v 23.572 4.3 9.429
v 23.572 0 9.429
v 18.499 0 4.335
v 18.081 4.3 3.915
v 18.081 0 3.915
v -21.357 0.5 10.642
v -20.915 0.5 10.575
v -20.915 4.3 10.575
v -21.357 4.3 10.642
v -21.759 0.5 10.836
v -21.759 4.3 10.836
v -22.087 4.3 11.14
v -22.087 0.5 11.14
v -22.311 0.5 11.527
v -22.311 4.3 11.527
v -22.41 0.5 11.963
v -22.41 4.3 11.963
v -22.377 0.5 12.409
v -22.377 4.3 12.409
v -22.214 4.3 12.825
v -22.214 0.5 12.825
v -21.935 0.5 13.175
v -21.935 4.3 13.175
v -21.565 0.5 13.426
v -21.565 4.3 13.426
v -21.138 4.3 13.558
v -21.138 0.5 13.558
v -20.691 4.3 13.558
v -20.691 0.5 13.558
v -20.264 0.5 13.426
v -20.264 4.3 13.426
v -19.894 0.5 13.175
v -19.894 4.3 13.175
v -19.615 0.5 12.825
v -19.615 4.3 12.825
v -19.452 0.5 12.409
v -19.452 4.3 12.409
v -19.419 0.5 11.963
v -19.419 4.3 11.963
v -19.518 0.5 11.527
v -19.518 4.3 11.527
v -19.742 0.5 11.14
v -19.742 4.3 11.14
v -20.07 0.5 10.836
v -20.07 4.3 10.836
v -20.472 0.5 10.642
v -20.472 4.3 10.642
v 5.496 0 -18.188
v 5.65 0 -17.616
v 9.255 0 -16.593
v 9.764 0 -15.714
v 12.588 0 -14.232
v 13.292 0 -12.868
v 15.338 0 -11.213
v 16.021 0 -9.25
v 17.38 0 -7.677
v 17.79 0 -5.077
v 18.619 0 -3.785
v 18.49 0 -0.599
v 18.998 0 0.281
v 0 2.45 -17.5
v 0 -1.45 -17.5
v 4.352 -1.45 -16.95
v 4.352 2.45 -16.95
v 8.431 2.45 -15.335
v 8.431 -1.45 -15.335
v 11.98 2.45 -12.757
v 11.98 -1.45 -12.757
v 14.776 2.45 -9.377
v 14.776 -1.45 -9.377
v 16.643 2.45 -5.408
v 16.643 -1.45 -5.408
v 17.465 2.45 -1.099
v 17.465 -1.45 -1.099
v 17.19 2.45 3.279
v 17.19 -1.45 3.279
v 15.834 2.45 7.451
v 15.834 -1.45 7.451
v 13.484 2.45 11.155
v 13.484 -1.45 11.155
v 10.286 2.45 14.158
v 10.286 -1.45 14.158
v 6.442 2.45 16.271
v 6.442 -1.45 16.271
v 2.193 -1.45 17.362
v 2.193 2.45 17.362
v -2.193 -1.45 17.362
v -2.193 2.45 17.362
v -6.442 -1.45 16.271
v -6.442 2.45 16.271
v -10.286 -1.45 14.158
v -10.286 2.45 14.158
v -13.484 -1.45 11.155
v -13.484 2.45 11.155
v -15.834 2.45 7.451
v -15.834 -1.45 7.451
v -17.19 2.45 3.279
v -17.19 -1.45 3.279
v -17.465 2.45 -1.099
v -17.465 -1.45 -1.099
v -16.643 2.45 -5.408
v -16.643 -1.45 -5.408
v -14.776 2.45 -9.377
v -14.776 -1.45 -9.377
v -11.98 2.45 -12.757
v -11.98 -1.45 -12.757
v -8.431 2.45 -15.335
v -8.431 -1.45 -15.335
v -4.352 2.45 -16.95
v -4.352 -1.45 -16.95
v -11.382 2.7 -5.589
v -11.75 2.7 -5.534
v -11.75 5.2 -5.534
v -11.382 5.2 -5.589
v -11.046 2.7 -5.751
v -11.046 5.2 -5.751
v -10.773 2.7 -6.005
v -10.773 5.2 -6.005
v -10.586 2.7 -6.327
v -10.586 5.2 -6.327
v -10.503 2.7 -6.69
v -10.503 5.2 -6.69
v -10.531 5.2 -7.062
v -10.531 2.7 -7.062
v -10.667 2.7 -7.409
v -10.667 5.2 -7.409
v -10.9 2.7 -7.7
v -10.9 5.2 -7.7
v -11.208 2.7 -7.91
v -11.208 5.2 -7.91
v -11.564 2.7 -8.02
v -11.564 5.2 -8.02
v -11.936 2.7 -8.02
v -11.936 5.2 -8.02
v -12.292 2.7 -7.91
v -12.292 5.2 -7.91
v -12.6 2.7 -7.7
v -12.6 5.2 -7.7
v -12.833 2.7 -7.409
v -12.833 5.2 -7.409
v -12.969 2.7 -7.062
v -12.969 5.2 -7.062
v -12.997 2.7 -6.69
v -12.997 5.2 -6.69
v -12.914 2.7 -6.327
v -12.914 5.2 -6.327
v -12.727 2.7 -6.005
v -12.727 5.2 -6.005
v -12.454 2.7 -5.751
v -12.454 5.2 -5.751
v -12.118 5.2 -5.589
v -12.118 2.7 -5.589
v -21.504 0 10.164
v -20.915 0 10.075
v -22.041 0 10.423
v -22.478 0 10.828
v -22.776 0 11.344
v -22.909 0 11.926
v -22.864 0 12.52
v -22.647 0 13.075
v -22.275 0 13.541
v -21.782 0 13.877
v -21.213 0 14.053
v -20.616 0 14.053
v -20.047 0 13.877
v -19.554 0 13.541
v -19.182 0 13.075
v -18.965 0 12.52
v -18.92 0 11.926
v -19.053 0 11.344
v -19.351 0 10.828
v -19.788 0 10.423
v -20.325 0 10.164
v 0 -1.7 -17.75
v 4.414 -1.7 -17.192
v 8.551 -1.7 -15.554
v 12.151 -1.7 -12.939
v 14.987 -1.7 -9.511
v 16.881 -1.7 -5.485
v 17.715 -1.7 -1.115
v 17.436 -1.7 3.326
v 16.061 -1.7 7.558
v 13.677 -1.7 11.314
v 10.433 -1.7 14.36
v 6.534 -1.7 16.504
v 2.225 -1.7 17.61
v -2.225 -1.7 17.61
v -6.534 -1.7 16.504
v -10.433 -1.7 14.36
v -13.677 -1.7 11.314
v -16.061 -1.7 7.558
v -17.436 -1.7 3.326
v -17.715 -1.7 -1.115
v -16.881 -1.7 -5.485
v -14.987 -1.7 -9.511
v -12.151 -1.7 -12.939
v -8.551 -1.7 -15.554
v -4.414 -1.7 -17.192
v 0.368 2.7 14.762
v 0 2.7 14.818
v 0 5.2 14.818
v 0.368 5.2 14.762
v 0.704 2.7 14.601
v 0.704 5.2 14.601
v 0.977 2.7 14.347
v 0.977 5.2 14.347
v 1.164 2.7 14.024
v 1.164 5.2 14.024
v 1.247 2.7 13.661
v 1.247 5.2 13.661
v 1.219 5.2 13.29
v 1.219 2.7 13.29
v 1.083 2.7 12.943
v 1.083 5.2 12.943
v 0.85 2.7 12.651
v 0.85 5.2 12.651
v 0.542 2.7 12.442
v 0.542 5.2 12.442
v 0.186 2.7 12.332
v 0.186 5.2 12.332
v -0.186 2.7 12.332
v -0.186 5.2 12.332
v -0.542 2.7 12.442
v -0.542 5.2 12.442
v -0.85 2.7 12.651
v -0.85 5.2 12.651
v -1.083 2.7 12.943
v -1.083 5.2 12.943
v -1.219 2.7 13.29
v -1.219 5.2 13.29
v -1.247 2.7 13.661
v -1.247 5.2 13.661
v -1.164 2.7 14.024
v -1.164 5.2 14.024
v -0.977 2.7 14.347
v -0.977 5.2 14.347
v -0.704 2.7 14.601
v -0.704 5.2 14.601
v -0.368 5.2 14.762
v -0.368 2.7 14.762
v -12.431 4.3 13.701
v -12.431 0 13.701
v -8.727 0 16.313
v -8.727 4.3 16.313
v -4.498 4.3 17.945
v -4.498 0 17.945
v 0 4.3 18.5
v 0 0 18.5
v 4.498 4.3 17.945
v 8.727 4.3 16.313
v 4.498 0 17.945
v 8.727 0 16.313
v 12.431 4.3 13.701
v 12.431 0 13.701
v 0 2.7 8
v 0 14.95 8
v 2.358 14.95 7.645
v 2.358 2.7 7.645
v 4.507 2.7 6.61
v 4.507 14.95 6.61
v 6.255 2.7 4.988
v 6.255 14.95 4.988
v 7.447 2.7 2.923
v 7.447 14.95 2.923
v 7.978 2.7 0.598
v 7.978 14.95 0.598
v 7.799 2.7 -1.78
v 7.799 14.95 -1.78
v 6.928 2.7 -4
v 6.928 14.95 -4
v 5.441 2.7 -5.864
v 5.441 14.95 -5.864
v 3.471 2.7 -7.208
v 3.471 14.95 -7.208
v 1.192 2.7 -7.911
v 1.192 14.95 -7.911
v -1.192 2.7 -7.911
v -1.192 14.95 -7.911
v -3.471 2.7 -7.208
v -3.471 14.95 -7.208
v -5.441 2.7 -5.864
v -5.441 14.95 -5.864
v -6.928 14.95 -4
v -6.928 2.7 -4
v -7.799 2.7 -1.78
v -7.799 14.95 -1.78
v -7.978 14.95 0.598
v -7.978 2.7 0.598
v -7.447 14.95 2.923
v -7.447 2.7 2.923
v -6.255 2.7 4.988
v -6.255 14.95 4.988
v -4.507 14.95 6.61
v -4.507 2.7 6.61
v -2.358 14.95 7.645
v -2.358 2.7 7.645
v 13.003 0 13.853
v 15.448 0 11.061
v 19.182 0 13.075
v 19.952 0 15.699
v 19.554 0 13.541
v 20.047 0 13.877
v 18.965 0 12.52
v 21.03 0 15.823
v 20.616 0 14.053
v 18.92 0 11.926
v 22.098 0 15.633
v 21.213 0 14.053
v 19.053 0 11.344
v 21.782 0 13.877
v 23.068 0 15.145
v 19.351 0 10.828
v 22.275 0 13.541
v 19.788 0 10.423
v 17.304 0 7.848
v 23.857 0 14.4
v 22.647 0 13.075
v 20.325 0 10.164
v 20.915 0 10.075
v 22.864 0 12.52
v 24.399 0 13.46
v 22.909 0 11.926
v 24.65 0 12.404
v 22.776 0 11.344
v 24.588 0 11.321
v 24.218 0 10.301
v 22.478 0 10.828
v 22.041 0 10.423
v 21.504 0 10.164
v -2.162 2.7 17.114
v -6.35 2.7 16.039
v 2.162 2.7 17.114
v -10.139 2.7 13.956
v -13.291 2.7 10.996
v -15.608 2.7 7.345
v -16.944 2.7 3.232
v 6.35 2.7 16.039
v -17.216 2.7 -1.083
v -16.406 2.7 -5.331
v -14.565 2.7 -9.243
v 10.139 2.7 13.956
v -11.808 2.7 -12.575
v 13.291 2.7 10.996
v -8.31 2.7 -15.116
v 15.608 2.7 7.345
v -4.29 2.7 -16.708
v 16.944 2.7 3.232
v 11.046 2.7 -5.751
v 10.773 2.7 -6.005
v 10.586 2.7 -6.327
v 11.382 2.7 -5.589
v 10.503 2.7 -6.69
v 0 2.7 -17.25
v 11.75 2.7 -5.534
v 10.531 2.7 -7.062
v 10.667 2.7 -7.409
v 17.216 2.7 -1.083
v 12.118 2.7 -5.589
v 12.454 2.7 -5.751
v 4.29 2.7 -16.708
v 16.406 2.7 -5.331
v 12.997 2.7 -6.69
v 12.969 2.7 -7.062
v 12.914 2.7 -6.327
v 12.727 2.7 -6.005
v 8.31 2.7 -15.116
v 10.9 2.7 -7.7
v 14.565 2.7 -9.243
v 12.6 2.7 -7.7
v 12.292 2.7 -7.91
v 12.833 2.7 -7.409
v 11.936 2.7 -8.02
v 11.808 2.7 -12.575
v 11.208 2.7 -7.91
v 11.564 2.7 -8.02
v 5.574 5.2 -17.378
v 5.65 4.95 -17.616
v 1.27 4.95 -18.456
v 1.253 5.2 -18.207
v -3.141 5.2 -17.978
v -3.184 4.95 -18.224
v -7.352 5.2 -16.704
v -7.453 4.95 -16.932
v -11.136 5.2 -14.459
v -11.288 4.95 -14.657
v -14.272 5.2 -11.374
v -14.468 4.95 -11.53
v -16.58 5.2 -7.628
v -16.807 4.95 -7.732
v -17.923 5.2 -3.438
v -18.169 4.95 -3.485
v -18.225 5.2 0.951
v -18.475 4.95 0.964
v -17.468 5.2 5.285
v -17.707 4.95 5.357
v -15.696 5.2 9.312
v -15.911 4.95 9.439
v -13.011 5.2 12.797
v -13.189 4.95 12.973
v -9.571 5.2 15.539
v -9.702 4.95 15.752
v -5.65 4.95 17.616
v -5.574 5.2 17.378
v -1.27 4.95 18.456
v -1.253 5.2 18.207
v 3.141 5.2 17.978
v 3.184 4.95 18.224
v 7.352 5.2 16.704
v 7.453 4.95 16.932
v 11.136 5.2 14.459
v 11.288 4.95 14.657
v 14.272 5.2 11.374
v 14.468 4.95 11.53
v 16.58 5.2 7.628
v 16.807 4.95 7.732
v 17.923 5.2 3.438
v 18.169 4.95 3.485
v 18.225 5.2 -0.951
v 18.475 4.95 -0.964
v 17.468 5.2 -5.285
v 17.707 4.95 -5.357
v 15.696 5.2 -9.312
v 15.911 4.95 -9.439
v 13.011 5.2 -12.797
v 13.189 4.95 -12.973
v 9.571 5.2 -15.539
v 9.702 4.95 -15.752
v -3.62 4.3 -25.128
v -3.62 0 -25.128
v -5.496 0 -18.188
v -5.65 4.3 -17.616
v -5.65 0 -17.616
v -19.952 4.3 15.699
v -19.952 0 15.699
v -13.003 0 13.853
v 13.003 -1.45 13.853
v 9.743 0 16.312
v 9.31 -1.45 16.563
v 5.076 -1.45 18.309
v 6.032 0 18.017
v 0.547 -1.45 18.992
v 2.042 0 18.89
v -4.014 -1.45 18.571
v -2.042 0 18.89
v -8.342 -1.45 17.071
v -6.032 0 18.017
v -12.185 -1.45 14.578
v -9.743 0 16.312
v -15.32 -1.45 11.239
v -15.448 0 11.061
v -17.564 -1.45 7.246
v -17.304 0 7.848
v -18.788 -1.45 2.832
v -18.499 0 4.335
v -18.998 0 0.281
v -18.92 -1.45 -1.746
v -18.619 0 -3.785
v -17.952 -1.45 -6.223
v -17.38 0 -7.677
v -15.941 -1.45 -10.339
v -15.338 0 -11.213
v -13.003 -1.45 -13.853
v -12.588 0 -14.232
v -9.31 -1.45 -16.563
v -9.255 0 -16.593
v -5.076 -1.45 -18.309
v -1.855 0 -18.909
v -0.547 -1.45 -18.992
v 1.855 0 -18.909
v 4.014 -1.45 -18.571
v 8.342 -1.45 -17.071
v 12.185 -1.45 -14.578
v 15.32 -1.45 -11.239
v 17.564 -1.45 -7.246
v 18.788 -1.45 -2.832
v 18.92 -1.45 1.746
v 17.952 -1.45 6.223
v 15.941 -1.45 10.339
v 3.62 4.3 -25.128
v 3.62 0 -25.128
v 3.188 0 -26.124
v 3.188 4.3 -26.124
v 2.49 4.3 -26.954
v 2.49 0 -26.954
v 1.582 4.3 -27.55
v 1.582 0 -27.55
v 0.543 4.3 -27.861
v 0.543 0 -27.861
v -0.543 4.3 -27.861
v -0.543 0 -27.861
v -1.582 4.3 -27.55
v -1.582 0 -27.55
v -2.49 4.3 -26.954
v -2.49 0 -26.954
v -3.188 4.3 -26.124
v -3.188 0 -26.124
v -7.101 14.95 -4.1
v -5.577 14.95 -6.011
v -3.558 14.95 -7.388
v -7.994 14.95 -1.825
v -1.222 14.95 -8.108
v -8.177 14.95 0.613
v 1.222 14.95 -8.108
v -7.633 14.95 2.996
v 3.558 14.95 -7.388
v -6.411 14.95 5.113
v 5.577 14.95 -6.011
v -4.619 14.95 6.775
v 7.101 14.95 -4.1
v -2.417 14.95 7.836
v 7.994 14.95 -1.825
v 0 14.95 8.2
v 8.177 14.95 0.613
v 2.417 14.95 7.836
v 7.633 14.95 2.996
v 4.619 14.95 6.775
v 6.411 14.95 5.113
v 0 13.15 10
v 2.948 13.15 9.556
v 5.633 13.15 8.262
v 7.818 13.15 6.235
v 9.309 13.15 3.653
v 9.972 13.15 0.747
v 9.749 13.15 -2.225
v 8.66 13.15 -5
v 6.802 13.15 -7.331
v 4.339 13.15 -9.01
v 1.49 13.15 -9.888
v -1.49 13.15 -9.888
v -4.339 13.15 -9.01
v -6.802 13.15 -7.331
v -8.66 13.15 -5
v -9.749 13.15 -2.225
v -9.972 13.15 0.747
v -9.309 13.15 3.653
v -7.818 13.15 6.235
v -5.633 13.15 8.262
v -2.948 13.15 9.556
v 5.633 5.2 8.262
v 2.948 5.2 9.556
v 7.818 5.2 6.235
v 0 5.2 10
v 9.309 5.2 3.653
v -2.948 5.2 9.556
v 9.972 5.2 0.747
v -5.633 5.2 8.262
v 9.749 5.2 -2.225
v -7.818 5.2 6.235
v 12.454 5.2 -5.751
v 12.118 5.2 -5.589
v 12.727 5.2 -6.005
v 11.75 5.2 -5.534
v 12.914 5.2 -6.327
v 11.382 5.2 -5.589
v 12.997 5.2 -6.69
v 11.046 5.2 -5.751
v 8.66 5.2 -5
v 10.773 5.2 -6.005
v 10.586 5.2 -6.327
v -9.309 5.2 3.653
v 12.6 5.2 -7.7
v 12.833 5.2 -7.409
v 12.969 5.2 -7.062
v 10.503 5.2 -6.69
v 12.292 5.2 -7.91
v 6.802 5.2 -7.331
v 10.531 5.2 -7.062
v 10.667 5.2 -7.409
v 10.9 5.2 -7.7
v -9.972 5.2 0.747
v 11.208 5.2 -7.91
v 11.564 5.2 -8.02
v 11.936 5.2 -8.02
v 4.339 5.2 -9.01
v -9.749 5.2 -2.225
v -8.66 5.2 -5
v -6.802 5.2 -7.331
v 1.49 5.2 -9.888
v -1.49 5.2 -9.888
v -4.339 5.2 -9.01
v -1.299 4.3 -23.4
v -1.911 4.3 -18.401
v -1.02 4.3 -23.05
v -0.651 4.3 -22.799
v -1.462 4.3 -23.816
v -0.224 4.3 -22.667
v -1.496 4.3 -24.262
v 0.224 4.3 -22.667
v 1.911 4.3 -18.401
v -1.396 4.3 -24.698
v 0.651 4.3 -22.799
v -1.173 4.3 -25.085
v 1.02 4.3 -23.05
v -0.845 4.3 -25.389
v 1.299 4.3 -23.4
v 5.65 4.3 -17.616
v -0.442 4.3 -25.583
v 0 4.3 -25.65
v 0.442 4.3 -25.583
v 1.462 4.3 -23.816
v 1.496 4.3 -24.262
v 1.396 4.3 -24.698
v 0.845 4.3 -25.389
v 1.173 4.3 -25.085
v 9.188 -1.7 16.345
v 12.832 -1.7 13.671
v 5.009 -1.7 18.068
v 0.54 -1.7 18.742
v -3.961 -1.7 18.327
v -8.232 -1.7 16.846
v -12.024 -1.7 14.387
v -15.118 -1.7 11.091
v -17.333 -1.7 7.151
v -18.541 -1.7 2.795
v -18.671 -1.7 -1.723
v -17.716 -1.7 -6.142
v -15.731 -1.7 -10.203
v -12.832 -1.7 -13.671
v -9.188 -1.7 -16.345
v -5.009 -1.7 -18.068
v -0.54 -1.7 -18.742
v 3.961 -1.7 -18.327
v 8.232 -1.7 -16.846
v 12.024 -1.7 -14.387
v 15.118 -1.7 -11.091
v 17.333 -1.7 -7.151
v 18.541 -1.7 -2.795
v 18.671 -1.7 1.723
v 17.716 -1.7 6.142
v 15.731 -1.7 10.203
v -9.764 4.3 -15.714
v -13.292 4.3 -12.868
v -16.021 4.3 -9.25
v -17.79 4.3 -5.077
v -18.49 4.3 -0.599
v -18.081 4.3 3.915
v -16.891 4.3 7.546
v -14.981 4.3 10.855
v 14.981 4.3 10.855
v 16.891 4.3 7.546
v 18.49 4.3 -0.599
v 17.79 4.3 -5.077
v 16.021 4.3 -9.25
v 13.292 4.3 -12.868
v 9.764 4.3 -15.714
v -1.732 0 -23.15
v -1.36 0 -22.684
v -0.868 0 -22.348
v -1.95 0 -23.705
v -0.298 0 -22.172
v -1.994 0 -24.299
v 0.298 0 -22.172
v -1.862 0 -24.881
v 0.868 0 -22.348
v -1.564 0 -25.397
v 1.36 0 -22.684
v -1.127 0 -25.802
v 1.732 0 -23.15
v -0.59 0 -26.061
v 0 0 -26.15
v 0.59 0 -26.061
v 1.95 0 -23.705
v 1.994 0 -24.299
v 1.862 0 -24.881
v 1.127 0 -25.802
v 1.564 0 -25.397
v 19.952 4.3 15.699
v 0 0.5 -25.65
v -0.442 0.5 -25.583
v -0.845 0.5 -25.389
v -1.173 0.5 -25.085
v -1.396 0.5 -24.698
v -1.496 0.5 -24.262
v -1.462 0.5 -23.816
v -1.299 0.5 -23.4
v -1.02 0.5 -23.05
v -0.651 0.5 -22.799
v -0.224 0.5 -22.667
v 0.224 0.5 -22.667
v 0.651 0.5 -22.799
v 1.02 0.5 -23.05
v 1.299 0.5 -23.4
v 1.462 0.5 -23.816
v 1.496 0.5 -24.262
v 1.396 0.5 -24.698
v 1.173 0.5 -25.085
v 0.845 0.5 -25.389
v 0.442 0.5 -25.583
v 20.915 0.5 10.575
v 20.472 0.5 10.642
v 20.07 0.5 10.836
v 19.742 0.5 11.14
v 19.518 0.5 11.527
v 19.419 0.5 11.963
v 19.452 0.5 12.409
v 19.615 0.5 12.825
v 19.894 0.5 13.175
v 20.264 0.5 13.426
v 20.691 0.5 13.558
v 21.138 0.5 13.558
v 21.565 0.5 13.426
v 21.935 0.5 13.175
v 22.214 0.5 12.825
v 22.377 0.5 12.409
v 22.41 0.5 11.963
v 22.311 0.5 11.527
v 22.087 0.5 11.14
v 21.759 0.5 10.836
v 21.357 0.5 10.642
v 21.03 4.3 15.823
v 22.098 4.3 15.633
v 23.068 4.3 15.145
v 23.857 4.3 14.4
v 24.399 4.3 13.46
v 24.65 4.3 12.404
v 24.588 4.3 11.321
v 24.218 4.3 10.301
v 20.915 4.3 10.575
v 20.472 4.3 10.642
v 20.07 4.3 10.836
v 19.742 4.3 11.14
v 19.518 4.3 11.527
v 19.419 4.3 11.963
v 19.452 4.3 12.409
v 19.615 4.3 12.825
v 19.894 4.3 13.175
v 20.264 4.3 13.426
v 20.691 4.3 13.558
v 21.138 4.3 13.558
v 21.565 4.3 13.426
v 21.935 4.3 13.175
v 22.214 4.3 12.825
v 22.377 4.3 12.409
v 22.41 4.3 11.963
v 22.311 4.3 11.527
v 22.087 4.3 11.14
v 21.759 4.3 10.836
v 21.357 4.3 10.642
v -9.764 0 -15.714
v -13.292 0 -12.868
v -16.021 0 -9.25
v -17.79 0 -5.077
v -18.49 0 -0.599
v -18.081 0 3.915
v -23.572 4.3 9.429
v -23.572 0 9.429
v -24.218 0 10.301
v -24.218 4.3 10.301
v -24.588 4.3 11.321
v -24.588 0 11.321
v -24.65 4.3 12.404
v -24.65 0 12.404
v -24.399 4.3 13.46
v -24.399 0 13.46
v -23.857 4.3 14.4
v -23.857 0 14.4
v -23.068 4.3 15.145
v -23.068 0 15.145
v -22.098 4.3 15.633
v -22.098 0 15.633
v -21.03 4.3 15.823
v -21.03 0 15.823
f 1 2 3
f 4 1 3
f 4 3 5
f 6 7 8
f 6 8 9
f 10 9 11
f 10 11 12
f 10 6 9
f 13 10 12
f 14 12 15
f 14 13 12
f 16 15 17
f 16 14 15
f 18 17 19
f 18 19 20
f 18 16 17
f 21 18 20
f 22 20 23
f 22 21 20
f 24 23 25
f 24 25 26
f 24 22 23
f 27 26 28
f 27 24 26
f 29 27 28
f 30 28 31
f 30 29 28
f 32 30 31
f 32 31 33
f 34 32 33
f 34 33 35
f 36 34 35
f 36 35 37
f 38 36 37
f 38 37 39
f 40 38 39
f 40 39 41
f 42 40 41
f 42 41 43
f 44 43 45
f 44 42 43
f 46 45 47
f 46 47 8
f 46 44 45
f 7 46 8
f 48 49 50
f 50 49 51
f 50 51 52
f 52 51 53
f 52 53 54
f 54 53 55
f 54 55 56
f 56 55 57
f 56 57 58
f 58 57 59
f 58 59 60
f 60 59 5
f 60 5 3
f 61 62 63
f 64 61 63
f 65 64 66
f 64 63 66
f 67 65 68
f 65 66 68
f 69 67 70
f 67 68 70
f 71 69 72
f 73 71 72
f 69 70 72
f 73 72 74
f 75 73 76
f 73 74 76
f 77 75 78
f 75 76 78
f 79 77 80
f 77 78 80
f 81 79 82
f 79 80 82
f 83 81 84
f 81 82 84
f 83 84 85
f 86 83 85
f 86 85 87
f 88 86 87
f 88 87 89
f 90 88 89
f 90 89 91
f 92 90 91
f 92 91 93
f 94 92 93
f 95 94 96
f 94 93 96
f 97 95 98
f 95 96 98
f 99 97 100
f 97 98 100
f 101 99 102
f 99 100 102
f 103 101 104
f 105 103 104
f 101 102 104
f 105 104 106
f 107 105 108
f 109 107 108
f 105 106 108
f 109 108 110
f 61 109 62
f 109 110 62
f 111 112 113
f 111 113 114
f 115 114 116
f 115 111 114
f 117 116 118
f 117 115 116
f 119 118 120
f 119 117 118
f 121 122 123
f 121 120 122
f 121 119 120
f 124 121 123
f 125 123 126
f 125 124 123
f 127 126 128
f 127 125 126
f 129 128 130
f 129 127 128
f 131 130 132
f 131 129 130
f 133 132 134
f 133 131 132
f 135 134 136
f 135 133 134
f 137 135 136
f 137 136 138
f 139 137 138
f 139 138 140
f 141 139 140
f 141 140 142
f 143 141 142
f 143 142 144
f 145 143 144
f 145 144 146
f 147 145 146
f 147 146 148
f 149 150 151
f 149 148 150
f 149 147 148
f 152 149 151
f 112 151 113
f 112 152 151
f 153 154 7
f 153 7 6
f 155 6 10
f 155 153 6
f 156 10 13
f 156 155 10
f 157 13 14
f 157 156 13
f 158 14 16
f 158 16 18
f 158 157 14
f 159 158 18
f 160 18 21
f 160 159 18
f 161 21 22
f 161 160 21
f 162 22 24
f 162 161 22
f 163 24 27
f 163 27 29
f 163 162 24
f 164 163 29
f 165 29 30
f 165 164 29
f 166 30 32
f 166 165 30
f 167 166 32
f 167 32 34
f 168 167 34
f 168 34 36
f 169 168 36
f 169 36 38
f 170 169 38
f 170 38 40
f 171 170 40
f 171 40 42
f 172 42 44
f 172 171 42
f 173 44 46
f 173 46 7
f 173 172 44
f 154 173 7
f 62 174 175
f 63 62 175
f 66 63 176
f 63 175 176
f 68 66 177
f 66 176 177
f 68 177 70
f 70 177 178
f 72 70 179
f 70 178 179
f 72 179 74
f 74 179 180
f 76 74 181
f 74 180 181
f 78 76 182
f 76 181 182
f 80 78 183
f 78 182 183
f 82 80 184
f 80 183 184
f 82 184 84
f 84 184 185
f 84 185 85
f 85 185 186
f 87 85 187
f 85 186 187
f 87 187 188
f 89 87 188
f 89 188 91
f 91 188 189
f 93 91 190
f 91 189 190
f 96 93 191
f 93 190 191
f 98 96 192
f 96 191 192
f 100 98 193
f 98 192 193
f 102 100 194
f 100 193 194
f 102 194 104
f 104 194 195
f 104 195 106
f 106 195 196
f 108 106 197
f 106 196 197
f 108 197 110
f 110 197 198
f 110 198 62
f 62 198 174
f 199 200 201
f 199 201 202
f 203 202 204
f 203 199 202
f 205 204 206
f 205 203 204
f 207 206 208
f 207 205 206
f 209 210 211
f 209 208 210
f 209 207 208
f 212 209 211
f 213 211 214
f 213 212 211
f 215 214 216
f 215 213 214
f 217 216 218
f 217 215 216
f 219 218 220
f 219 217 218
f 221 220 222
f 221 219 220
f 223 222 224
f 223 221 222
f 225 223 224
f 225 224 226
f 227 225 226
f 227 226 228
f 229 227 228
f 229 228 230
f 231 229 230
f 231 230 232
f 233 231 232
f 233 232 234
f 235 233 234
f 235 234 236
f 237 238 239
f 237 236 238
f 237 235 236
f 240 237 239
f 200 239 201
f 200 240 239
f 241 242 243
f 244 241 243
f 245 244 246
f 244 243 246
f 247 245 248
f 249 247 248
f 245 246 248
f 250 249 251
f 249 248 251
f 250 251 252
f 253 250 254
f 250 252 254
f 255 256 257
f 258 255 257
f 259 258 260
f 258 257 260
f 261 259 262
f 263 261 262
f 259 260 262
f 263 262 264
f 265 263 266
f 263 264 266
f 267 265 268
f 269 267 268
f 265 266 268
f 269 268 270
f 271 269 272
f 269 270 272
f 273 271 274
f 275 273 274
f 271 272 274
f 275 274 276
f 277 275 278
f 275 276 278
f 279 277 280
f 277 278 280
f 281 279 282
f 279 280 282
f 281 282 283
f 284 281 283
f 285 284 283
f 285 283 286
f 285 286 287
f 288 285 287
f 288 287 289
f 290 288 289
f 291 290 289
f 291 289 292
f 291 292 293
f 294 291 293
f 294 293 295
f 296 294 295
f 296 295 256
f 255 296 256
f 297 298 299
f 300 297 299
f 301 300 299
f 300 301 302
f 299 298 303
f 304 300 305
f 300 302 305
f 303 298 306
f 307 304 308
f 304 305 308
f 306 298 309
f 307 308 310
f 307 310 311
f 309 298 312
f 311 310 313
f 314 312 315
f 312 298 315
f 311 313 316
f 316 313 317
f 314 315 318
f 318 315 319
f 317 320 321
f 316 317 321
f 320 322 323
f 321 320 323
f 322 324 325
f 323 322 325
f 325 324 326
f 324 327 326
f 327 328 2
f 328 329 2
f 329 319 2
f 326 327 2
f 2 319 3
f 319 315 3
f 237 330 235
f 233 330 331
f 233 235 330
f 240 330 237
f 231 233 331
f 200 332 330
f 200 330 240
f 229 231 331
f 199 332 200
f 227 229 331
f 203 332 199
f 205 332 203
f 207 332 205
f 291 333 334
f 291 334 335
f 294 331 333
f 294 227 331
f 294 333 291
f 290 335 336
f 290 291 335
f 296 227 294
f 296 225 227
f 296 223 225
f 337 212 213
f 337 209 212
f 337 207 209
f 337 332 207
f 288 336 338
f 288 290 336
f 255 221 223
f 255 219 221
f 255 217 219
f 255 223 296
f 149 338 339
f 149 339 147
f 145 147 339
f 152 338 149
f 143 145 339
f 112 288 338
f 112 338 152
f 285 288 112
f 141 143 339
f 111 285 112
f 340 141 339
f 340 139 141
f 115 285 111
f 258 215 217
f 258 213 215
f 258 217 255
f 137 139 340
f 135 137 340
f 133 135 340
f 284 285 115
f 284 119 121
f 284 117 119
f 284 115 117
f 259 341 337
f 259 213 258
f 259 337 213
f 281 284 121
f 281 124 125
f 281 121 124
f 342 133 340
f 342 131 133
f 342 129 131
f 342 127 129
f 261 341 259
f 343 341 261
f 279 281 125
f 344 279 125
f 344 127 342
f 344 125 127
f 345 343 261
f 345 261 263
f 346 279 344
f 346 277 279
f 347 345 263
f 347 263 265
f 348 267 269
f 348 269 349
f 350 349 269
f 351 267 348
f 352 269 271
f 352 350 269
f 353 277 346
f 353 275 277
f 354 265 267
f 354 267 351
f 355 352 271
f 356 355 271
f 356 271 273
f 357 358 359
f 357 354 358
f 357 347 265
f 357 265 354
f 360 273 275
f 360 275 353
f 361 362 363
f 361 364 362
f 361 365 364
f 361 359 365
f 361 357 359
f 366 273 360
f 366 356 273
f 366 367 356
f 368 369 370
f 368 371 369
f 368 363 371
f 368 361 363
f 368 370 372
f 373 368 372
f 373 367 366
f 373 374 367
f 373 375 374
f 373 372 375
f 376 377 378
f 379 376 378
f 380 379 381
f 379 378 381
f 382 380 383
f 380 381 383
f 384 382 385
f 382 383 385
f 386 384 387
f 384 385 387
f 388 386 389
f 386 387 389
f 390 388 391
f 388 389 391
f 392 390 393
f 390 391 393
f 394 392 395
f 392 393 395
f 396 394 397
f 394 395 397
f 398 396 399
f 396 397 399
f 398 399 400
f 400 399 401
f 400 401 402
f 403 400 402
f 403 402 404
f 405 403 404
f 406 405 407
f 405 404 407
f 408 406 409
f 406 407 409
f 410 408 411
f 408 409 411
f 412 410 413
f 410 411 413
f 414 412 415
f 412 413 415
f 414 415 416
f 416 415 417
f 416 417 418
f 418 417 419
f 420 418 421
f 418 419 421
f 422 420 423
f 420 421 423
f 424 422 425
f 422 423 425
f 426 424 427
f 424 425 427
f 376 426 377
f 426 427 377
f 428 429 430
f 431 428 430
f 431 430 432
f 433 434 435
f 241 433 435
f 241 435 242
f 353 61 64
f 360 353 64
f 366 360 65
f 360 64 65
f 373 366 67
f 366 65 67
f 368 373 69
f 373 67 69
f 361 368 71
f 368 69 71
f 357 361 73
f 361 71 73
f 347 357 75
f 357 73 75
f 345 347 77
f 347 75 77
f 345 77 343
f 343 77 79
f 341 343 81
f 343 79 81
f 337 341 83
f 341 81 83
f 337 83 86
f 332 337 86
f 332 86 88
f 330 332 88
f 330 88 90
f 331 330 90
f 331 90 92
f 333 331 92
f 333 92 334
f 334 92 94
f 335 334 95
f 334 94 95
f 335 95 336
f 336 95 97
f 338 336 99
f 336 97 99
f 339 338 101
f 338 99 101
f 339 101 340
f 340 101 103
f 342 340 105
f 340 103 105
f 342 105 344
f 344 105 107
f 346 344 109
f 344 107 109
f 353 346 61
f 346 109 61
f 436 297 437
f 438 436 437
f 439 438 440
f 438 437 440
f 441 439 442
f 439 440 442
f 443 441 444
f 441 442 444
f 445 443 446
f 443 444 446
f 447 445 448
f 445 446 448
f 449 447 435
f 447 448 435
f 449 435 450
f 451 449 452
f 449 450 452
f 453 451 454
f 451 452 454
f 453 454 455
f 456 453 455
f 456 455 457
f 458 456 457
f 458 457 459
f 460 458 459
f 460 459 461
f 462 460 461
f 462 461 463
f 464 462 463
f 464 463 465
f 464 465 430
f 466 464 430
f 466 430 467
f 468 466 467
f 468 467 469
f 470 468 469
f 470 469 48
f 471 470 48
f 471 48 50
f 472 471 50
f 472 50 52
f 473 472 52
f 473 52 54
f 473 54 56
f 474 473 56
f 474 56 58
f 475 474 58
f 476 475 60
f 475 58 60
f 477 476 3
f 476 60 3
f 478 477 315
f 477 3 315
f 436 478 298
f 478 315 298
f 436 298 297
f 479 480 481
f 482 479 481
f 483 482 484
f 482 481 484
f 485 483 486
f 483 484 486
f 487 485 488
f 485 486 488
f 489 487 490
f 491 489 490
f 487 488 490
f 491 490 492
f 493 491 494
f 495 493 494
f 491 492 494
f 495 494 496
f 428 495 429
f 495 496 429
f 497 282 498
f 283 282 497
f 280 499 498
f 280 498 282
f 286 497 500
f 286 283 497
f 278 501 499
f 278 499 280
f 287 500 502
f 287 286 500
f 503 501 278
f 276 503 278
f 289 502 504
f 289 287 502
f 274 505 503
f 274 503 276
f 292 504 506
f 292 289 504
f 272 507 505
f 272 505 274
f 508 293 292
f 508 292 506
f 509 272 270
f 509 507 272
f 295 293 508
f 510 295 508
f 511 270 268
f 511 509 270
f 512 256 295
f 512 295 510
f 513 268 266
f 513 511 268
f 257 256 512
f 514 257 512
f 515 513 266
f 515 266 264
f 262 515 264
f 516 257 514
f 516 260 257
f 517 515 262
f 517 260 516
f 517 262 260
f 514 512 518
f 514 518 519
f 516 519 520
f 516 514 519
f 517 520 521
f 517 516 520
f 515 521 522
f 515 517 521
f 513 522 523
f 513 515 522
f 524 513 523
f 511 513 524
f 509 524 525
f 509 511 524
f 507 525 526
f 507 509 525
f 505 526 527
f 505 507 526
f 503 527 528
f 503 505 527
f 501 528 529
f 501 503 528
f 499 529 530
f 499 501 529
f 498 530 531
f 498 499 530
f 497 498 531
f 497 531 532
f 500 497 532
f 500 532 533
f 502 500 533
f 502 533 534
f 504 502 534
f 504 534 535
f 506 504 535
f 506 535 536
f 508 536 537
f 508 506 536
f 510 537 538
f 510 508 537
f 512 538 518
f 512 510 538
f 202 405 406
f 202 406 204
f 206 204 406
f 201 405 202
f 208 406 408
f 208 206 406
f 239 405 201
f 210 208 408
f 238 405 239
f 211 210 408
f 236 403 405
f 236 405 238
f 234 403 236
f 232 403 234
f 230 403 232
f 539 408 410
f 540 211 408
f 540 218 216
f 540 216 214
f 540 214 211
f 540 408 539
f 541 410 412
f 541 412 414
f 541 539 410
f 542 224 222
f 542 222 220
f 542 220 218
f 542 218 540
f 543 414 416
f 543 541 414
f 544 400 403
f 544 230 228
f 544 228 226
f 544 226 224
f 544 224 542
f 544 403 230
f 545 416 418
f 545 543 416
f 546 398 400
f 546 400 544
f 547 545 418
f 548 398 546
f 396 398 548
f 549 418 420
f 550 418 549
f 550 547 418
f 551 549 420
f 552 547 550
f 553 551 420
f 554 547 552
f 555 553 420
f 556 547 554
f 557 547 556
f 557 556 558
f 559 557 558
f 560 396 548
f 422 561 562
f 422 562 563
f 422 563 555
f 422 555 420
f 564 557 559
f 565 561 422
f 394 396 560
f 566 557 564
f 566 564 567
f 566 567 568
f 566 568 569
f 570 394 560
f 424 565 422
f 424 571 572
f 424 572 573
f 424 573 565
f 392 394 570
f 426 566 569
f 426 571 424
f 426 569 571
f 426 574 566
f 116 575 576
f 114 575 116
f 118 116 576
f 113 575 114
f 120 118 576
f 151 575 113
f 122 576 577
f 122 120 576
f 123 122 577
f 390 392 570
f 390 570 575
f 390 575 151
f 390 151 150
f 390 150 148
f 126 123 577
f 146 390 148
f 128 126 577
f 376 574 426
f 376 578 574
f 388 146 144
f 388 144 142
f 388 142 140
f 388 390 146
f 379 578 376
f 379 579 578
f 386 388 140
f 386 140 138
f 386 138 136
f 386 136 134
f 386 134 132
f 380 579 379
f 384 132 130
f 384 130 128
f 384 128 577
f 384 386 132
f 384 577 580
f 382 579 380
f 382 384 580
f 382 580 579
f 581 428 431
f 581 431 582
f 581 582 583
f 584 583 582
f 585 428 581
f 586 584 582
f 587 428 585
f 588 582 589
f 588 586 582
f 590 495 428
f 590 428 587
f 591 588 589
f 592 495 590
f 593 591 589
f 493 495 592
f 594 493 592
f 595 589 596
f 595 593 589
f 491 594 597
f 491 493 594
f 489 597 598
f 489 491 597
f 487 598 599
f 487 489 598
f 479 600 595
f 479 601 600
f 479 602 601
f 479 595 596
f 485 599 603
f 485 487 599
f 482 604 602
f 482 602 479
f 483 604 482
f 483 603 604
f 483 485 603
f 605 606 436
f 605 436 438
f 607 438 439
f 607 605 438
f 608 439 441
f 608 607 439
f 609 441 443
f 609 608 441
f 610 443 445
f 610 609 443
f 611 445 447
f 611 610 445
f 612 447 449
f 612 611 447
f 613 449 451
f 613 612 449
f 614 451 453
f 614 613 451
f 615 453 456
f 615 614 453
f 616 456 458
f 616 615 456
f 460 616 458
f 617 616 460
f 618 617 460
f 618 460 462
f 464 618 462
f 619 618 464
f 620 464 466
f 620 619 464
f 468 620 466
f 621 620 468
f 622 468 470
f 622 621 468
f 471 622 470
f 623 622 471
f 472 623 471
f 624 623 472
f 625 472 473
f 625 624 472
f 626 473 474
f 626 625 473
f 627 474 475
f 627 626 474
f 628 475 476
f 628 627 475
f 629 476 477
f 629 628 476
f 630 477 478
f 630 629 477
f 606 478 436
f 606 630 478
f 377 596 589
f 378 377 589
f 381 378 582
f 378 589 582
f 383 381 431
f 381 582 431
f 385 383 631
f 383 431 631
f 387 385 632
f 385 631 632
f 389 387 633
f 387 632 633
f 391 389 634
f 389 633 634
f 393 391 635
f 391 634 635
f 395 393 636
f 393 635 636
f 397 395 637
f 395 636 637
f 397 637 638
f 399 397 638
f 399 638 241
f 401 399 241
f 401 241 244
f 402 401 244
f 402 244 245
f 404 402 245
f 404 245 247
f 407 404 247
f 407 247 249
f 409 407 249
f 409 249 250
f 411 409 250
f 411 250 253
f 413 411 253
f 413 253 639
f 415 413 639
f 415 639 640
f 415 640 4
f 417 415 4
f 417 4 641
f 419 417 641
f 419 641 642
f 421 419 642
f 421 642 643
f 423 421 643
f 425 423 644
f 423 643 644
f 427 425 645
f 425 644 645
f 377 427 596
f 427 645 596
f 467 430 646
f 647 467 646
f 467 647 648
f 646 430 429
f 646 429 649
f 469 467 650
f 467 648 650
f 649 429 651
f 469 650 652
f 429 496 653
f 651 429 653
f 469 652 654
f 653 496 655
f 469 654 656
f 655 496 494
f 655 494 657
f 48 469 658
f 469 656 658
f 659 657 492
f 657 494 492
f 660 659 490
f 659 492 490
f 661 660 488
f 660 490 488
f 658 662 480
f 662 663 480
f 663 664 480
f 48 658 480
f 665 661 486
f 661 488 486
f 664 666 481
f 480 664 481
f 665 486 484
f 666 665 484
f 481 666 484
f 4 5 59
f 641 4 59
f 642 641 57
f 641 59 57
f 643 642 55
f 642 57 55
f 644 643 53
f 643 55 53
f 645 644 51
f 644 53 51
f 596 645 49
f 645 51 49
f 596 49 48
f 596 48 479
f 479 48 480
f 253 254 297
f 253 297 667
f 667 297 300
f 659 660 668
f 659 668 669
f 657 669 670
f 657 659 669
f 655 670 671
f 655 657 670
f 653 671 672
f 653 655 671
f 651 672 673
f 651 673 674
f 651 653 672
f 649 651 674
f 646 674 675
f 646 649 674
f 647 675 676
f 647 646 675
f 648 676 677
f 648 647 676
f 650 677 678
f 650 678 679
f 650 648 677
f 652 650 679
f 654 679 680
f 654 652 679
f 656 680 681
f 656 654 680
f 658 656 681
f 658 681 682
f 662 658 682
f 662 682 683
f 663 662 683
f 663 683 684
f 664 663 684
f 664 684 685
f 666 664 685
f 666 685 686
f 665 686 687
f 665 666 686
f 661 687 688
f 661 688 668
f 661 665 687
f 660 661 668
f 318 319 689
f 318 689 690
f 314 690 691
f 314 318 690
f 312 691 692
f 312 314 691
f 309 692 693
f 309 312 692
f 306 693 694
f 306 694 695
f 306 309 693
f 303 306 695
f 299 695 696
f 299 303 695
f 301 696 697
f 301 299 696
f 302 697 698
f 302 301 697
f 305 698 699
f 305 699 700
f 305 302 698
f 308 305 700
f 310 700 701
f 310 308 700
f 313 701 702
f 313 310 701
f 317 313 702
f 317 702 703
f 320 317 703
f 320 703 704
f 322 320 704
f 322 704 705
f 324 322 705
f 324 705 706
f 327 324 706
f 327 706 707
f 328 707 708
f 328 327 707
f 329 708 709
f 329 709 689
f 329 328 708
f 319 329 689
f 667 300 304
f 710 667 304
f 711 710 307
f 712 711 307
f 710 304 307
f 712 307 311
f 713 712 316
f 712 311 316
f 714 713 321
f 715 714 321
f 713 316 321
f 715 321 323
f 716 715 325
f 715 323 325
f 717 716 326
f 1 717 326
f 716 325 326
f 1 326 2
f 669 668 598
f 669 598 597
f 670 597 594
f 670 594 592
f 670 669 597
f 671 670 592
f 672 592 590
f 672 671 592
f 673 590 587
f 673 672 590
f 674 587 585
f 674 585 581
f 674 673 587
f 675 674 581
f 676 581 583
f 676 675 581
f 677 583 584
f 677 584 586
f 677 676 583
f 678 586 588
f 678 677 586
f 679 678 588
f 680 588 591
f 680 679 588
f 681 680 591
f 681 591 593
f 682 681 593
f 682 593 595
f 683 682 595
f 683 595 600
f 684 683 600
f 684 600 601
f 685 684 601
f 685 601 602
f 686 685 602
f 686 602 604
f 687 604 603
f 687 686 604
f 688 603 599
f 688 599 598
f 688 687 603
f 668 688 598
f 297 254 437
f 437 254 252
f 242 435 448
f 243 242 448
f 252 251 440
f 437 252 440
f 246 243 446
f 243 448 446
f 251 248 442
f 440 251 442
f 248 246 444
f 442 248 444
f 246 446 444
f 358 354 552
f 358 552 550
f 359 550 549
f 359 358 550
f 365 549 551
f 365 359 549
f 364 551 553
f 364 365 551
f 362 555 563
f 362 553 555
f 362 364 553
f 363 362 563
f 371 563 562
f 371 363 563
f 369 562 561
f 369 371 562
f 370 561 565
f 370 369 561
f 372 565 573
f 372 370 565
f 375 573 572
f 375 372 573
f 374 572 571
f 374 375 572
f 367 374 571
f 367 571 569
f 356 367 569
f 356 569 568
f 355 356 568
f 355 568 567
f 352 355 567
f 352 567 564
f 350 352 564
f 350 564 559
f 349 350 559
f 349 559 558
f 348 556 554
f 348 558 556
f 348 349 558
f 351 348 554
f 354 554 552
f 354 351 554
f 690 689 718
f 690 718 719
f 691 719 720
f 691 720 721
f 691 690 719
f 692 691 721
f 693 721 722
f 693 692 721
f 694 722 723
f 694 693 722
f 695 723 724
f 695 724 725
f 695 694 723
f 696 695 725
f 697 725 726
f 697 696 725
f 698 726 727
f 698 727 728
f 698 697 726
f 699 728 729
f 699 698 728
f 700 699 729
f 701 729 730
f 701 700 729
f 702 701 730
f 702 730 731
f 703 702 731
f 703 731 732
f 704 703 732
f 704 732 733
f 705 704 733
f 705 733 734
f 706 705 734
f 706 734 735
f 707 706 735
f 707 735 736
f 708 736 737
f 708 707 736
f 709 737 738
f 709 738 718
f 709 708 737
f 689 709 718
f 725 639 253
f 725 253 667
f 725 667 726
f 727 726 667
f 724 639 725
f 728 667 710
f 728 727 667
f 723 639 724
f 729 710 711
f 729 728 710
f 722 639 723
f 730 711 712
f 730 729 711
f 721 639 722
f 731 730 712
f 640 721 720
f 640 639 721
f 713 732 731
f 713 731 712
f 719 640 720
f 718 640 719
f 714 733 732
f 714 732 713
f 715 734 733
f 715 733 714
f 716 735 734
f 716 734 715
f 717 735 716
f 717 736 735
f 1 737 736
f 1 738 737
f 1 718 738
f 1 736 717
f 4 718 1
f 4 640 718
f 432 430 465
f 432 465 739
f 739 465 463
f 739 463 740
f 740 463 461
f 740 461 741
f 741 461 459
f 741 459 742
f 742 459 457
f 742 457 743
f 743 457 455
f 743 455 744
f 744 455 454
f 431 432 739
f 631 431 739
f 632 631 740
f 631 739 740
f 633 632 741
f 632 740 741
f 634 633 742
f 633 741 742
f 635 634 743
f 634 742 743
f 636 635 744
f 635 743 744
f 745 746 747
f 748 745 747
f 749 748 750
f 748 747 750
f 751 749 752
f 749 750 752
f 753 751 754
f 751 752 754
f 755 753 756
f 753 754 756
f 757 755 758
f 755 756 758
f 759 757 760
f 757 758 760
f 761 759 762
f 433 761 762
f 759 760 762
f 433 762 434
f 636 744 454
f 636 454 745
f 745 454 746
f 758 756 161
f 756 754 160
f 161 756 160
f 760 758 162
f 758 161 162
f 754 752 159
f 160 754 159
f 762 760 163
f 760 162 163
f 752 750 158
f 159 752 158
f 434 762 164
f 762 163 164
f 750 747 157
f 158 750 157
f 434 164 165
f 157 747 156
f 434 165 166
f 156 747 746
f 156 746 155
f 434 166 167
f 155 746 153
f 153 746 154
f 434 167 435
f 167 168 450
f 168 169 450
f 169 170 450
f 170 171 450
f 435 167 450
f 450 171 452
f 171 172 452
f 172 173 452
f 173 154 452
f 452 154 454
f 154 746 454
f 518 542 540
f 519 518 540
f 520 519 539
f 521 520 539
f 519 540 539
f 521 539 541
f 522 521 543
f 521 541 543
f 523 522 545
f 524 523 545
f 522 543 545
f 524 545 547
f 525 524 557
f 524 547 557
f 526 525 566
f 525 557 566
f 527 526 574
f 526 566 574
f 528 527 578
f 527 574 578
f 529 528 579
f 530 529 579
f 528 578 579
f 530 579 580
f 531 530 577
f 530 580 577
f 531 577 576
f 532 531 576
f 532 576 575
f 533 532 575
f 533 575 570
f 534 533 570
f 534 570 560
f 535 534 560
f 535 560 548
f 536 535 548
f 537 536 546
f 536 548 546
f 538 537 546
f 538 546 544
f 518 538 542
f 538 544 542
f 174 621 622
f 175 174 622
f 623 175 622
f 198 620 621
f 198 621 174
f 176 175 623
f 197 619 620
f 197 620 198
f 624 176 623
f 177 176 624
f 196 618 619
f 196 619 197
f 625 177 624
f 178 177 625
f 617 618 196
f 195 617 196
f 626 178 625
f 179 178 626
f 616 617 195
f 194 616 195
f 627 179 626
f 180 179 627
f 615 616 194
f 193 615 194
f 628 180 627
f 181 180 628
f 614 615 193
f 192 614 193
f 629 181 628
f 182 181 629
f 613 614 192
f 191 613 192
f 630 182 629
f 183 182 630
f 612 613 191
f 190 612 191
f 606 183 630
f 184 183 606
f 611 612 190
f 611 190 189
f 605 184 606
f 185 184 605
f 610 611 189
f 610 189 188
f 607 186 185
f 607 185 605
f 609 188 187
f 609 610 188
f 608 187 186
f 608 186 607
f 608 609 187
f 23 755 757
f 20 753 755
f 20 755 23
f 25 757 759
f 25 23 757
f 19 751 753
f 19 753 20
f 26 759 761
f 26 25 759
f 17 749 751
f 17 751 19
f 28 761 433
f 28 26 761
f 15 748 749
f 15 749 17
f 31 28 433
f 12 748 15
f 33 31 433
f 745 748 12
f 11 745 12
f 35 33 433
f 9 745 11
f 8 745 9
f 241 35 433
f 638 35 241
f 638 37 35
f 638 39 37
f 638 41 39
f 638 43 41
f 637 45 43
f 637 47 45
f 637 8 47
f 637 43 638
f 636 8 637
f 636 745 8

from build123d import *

# Parameters (mm, degrees)
SKETCH1_R               = 1.5
BOSS_EXTRUDE1_DEPTH     = 4.3
SKETCH3_R               = 18.5
BOSS_EXTRUDE2_DEPTH     = 0.9
CUT_EXTRUDE1_DEPTH      = 38.486507256
CUT_EXTRUDE1_DEPTH_BACK = 38.486507256
SKETCH2_R               = 1.25
SKETCH4_R               = 10
BOSS_EXTRUDE3_DEPTH     = 9.75
SKETCH5_R               = 8
CUT_EXTRUDE2_DEPTH      = 41.127929504
SKETCH6_R               = 19
BOSS_EXTRUDE4_DEPTH     = 1.7
SKETCH7_R               = 17.5
CUT_EXTRUDE3_DEPTH      = 4.4
CHAMFER1_SIZE           = 1.8
CHAMFER2_SIZE           = 0.25
CHAMFER3_SIZE           = 0.5


with BuildPart() as part:
    # Sketch1 → Boss-Extrude1 (new body)
    with BuildSketch(Plane(origin=(0, 0, 0), x_dir=(1, 0, 0), z_dir=(0, 1, 0))):
        with BuildLine():
            Line((-3.620168852, 25.128201147), (-5.65, 17.616114782))
            ThreePointArc((-5.65, 17.616114782), (-16.02146997, 9.25), (-18.081002917, -3.915013859))
            Line((-18.081002917, -3.915013859), (-23.57174497, -9.428942382))
            ThreePointArc((-23.57174497, -9.428942382), (-24.162108766, -13.95), (-19.951576119, -15.699258765))
            Line((-19.951576119, -15.699258765), (-12.431002917, -13.701100922))
            ThreePointArc((-12.431002917, -13.701100922), (0, -18.5), (12.431002917, -13.701100922))
            Line((12.431002917, -13.701100922), (19.951576119, -15.699258765))
            ThreePointArc((19.951576119, -15.699258765), (24.162108766, -13.95), (23.57174497, -9.428942382))
            Line((23.57174497, -9.428942382), (18.081002917, -3.915013859))
            ThreePointArc((18.081002917, -3.915013859), (16.02146997, 9.25), (5.65, 17.616114782))
            Line((5.65, 17.616114782), (3.620168852, 25.128201147))
            ThreePointArc((3.620168852, 25.128201147), (0, 27.9), (-3.620168852, 25.128201147))
        make_face()
        with Locations(Location((0, 24.15, 0), (0, 0, 90))):
            Circle(SKETCH1_R, mode=Mode.SUBTRACT)
        with Locations(Location((20.914513501, -12.075, 0), (0, 0, 90))):
            Circle(SKETCH1_R, mode=Mode.SUBTRACT)
        with Locations(Location((-20.914513501, -12.075, 0), (0, 0, 90))):
            Circle(SKETCH1_R, mode=Mode.SUBTRACT)
    extrude(amount=BOSS_EXTRUDE1_DEPTH)

    # Sketch3 → Boss-Extrude2 (add)
    with BuildSketch(Plane(origin=(0, 4.3, 0), x_dir=(1, 0, 0), z_dir=(0, 1, 0))):
        with Locations(Location((0, 0, 0), (0, 0, 72.217444278))):
            Circle(SKETCH3_R)
    extrude(amount=BOSS_EXTRUDE2_DEPTH)

    # Sketch2 → Cut-Extrude1 (cut, two sides: drawn at the far end of the back side and taken through both)
    with BuildSketch(Plane(origin=(0, 4.3, 0), x_dir=(1, 0, 0), z_dir=(0, 1, 0)).offset(-CUT_EXTRUDE1_DEPTH_BACK)):
        with Locations(Location((-11.75, 6.783865663, 0), (0, 0, 270))):
            Circle(SKETCH2_R)
        with Locations(Location((11.75, 6.783865663, 0), (0, 0, 270))):
            Circle(SKETCH2_R)
        with Locations(Location((0, -13.567731326, 0), (0, 0, 270))):
            Circle(SKETCH2_R)
    extrude(amount=CUT_EXTRUDE1_DEPTH + CUT_EXTRUDE1_DEPTH_BACK, mode=Mode.SUBTRACT)

    # Sketch4 → Boss-Extrude3 (add)
    with BuildSketch(Plane(origin=(0, 5.2, 0), x_dir=(1, 0, 0), z_dir=(0, 1, 0))):
        with Locations(Location((0, 0, 0), (0, 0, 270))):
            Circle(SKETCH4_R)
    extrude(amount=BOSS_EXTRUDE3_DEPTH)

    # Sketch5 → Cut-Extrude2 (cut, through all)
    with BuildSketch(Plane(origin=(0, 14.95, 0), x_dir=(1, 0, 0), z_dir=(0, 1, 0))):
        with Locations(Location((0, 0, 0), (0, 0, 270))):
            Circle(SKETCH5_R)
    extrude(amount=-CUT_EXTRUDE2_DEPTH, mode=Mode.SUBTRACT)

    # Sketch6 → Boss-Extrude4 (add)
    with BuildSketch(Plane.XZ):
        with Locations(Location((0, 0, 0), (0, 0, 46.812273556))):
            Circle(SKETCH6_R)
    extrude(amount=BOSS_EXTRUDE4_DEPTH)

    # Sketch7 → Cut-Extrude3 (cut)
    with BuildSketch(Plane(origin=(0, -1.7, 0), x_dir=(-1, 0, 0), z_dir=(0, -1, 0))):
        with Locations(Location((0, 0, 0), (0, 0, 90))):
            Circle(SKETCH7_R)
    extrude(amount=-CUT_EXTRUDE3_DEPTH, mode=Mode.SUBTRACT)

    # Chamfer1
    chamfer1_edges = [part.edges().sort_by_distance(p)[0] for p in [
        (0, 14.95, -10),
    ]]
    chamfer(chamfer1_edges, length=CHAMFER1_SIZE)

    # Chamfer2
    chamfer2_edges = [part.edges().sort_by_distance(p)[0] for p in [
        (0, -1.7, 17.5),
        (0, 2.7, 17.5),
        (-5.65, 5.2, 17.616114782),
        (-13.003427764, -1.7, -13.853189755),
    ]]
    chamfer(chamfer2_edges, length=CHAMFER2_SIZE)

    # Chamfer3
    chamfer3_edges = [part.edges().sort_by_distance(p)[0] for p in [
        (0, 0, -22.65),
        (20.914513501, 0, 13.575),
        (-20.914513501, 0, 13.575),
    ]]
    chamfer(chamfer3_edges, length=CHAMFER3_SIZE)


solid = part.part
